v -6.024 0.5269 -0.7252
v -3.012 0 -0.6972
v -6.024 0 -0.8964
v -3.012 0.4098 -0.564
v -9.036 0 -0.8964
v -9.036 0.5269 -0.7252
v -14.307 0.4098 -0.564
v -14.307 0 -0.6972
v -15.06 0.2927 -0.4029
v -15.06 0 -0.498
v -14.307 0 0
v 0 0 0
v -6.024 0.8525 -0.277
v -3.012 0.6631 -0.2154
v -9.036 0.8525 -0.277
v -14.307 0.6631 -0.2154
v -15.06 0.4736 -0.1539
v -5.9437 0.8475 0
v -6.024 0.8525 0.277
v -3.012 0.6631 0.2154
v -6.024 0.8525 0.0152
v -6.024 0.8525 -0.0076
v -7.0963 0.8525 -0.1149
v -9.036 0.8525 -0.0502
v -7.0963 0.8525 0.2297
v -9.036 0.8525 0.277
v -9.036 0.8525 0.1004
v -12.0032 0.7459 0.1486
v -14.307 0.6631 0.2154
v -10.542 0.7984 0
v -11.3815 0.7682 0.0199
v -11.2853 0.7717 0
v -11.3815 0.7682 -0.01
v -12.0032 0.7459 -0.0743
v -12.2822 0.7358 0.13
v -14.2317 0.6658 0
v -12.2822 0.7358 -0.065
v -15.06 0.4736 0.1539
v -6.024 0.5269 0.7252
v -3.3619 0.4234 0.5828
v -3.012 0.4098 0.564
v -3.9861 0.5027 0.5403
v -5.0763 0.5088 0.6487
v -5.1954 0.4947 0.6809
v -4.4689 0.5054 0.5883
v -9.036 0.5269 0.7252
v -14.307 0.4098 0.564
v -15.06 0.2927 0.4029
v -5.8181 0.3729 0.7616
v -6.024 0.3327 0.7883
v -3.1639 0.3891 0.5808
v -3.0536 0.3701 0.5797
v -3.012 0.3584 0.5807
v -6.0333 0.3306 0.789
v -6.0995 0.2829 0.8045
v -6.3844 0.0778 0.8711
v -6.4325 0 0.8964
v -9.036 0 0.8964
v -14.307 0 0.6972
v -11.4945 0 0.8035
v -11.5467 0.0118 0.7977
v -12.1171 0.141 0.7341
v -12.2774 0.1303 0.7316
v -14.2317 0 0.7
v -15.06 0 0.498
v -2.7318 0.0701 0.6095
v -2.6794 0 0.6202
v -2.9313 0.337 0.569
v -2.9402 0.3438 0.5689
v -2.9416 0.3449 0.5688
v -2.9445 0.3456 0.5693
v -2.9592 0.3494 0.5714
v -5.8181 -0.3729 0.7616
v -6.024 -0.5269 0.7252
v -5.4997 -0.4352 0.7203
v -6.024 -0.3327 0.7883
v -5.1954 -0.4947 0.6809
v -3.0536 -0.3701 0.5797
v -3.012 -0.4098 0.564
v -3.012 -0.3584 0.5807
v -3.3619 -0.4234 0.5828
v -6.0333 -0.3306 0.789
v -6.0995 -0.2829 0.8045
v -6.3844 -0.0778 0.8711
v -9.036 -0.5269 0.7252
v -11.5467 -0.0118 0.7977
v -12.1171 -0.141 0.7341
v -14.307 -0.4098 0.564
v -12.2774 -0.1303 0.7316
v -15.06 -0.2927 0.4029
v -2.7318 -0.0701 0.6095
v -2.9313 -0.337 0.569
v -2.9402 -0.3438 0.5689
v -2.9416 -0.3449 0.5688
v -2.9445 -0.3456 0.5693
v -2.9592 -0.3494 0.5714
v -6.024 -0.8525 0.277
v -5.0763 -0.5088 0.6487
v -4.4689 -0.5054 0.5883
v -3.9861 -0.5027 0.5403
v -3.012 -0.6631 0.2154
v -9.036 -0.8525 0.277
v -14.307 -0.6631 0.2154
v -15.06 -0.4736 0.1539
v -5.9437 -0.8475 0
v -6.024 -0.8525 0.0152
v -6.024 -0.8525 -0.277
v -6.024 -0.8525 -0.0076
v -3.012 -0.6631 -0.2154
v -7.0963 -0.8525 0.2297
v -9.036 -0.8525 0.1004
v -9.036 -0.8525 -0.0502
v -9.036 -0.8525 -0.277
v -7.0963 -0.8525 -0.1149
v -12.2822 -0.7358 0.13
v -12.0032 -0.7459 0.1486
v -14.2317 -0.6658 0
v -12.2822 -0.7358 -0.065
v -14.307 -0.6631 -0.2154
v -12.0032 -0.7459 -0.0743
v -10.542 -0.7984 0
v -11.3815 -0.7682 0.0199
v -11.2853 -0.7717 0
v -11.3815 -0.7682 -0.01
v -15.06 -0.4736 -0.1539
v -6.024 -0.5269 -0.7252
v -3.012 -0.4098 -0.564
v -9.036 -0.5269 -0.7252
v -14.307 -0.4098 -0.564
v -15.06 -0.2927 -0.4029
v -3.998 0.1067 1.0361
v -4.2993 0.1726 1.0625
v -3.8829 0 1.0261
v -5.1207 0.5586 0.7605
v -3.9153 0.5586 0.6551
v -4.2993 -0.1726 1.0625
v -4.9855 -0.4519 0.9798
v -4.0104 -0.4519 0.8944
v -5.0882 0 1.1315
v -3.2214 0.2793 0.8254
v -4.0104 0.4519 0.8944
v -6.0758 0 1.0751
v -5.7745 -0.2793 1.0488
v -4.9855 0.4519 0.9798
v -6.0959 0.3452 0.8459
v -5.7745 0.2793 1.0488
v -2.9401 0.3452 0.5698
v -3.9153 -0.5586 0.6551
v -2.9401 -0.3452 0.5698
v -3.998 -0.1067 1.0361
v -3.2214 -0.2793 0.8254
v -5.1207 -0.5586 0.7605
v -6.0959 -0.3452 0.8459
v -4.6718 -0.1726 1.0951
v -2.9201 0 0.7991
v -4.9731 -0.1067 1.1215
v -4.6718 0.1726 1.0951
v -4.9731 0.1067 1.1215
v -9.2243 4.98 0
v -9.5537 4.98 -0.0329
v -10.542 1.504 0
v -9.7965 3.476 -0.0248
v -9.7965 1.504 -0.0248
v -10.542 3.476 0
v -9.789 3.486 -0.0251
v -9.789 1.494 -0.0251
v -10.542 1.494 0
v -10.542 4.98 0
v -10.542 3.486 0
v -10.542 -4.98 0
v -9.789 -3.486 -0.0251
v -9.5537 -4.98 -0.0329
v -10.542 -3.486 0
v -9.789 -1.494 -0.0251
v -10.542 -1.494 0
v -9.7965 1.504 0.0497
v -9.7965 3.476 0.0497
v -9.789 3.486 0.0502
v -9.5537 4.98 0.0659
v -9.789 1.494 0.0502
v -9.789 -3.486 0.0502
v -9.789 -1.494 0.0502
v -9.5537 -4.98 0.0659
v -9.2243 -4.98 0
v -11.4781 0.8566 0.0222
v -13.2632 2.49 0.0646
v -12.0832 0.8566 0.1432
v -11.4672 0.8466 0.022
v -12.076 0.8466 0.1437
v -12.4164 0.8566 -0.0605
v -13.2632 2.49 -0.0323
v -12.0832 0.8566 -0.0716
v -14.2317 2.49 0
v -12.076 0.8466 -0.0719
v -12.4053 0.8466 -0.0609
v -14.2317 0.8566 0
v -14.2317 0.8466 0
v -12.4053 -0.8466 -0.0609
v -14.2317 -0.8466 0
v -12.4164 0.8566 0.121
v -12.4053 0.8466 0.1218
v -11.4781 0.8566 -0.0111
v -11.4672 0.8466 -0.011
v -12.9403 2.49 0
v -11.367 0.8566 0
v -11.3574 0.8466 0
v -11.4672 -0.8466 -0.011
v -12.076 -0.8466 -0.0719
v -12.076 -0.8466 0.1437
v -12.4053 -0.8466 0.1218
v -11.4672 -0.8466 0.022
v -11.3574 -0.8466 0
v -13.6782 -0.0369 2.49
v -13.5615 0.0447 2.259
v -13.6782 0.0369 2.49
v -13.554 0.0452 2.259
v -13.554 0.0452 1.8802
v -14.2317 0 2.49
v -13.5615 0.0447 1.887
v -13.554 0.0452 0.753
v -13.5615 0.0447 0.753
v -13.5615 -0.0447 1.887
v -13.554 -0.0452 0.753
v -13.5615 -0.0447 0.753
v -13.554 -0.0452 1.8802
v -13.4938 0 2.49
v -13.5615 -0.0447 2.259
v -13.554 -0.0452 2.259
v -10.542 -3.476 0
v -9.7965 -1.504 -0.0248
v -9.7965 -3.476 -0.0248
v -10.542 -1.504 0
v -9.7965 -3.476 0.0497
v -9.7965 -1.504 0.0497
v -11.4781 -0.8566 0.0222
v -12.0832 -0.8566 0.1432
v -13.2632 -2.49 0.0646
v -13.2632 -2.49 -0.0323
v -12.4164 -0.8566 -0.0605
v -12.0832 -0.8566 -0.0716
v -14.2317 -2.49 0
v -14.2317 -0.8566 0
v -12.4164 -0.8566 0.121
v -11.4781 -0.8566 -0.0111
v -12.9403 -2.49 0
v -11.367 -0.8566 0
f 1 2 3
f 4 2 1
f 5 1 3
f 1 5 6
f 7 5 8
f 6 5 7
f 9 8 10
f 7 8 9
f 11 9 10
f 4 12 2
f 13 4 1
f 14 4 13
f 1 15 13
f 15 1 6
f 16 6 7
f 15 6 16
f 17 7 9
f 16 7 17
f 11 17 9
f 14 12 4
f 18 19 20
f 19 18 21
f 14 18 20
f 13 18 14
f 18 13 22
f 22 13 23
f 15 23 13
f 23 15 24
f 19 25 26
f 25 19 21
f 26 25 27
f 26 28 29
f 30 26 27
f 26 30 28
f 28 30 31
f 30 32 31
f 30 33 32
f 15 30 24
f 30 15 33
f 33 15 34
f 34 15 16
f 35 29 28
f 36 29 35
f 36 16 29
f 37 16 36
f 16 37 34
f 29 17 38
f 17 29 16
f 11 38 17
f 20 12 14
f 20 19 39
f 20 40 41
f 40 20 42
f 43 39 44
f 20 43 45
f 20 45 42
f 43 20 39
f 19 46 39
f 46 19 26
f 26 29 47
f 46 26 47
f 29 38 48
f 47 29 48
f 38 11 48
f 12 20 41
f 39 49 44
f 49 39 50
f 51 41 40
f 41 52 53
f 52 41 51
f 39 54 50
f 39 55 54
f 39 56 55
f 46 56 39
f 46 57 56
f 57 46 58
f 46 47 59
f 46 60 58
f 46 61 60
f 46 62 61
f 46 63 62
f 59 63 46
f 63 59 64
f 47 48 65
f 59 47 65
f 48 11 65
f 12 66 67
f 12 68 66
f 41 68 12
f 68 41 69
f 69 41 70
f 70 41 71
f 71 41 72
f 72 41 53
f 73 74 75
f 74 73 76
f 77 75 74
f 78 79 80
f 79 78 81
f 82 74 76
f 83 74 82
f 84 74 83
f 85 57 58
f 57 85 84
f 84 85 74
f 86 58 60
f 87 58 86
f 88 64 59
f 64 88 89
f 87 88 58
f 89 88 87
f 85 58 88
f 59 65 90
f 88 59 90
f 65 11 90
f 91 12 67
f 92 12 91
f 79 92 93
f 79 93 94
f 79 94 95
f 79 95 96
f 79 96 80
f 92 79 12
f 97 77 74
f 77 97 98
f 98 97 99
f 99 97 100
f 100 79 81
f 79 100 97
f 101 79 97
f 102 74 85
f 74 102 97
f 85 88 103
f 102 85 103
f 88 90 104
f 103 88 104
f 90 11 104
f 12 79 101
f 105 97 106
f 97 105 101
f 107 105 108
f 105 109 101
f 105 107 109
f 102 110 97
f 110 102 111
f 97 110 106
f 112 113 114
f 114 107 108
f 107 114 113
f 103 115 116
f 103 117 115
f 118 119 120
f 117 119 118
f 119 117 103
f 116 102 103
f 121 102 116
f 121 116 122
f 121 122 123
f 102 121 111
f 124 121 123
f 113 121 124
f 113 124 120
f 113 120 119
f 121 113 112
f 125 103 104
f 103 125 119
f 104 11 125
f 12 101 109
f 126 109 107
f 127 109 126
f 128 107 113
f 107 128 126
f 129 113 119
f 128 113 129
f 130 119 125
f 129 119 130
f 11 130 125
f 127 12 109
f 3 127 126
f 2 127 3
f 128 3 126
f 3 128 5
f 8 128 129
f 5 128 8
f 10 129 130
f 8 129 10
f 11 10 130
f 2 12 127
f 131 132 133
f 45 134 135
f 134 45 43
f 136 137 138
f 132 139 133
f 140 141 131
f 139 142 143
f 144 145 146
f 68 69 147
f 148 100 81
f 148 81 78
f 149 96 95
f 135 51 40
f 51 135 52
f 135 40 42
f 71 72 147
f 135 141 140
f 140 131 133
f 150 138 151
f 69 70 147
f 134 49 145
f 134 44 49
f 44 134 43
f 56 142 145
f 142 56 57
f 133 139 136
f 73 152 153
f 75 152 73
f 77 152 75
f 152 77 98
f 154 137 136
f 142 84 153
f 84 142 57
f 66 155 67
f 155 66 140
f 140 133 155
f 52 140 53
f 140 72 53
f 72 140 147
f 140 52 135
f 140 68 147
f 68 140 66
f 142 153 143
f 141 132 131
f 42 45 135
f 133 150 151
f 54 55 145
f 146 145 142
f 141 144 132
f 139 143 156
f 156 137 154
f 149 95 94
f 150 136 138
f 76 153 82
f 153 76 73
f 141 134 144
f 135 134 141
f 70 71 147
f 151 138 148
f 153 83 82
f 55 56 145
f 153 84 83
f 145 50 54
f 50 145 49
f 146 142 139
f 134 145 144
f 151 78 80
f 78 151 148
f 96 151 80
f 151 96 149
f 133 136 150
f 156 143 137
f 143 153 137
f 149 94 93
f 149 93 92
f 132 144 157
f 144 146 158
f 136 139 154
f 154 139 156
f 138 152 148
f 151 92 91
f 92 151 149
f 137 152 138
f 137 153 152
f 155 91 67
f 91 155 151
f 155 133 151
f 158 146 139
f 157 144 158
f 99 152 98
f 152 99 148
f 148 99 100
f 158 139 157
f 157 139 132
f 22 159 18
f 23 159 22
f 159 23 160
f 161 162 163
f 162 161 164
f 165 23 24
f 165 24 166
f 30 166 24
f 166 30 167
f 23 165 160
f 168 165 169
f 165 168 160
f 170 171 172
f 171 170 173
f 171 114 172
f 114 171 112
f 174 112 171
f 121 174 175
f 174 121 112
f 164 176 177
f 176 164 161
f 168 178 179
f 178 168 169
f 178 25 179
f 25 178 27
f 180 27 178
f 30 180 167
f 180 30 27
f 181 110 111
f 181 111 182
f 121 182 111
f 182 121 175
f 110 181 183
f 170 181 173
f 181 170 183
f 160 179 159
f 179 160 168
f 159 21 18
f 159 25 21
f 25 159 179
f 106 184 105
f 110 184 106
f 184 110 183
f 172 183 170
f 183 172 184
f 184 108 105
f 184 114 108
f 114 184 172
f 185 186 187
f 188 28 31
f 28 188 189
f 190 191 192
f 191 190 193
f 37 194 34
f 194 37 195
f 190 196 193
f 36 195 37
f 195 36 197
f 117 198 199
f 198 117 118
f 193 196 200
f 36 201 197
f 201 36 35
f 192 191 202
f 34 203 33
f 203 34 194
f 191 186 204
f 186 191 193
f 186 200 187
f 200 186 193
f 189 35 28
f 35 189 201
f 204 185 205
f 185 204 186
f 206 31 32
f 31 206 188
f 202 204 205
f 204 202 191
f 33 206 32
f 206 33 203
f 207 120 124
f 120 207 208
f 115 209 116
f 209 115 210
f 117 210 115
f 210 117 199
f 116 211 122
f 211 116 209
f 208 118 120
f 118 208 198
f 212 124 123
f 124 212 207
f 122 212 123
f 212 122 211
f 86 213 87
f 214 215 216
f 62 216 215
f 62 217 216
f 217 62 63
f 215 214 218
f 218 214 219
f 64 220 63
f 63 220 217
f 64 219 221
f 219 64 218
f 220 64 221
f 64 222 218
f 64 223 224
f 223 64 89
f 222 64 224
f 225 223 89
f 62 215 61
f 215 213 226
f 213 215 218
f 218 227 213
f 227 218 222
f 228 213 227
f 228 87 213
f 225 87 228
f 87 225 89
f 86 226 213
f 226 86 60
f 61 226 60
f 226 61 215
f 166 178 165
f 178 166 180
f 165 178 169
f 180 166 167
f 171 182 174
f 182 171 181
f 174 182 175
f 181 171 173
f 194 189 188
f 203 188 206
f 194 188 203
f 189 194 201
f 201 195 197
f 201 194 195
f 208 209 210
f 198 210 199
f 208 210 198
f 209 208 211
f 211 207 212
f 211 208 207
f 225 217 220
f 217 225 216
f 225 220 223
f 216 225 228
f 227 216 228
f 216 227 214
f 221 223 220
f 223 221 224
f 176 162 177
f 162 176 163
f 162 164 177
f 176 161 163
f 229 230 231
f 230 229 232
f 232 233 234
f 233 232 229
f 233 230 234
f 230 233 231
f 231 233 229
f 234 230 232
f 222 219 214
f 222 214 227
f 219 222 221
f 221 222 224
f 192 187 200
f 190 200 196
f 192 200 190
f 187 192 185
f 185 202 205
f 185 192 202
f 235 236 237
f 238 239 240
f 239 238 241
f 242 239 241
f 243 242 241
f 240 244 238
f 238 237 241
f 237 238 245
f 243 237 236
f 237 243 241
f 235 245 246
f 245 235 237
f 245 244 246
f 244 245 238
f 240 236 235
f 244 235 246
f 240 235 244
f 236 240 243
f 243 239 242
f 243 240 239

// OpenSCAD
$fn=10;
length = 15.06;
wingspan = 9.96;

chord = length*0.35;
taper = 0.25;

tail_span = wingspan*0.5;
tail_chord = chord*0.7;
tail_taper = 0.35;

vert_span = tail_span;
vert_chord = tail_chord;
vert_taper = 0.2;

module wing(chord, wingspan, taper) {
    color([0.6, 0.6, 0.6]) translate([-chord, 0]) rotate([90, 0, 180]) linear_extrude(height=wingspan/2, scale=taper) polygon([
        [0, 0],
        [-chord*0.75, 0.05*chord],
        [-chord, 0],
        [-chord*0.75, -0.025*chord]
    ]);
}

module wing_sym(chord, wingspan, taper) {
    color([0.6, 0.6, 0.6]) translate([-chord, 0]) rotate([90, 0, 180]) linear_extrude(height=wingspan/2, scale=taper) polygon([
        [0, 0],
        [-chord*0.75, 0.05*chord],
        [-chord, 0],
        [-chord*0.75, -0.05*chord]
    ]);
}

module airframe_half() {
    translate([-length*0.35, 0]) wing(chord, wingspan, taper);
    translate([-length*0.7, 0]) wing(tail_chord, tail_span, tail_taper);
    translate([-length*0.7, 0]) rotate([90, 0, 0]) 
        wing(vert_chord, vert_span, vert_taper);
}

module body() {
    color([0.6, 0.6, 0.6]) rotate([0, -90, 0]) rotate_extrude() polygon([
        [0,0],
        [0.07*wingspan,0.2*length],
        [0.09*wingspan,0.4*length],
        [0.09*wingspan,0.6*length],
        [0.07*wingspan,0.95*length],
        [0.05*wingspan,length],
        [0,0.95*length]
    ]);
    color([0.6, 0.6, 0.8]) translate([-0.3*length, 0, 0.047*length]) rotate([0, 5, 0]) scale([1, 0.3, 0.2]) sphere(0.13*length);
}

module airframe_no_cuts() {
    body();
    translate([-length*0.35, 0]) wing(chord, wingspan, taper);
    mirror([0, 1, 0]) translate([-length*0.35, 0]) wing(chord, wingspan, taper);
    translate([-length*0.7, 0]) wing(tail_chord, tail_span, tail_taper);
    mirror([0, 1, 0]) translate([-length*0.7, 0]) wing(tail_chord, tail_span, tail_taper);
    translate([-length*0.7, 0]) rotate([90, 0, 0]) 
        wing_sym(vert_chord, vert_span, vert_taper);
}

module aileron_cut(s) {
    translate([-0.7*length, wingspan/4, 0]) scale([s, s, 1]) cube([length*0.1, wingspan*0.2, length*0.1], center=true);
}

module elevator_cut(s) {
    translate([-0.9*length, tail_span*0.37, 0]) scale([s, s, 1]) cube([length*0.3, wingspan*0.2, length*0.1], center=true);
}

module rudder_cut(s) {
    translate([-length*0.95, 0, length*0.1]) scale([s, s, 1]) cube([length*0.1, wingspan*0.2, length*0.1], center=true);
}

module airframe() {
    difference() {
        airframe_no_cuts();
        aileron_cut(1);
        mirror([0, 1, 0]) aileron_cut(1);
        elevator_cut(1);
        mirror([0, 1, 0]) elevator_cut(1);
        rudder_cut();
    }
}

module aileron() {
    color("red") render() intersection() {
        aileron_cut(0.99);
        airframe_no_cuts();
    }
}

module elevator() {
    color("red") render() intersection() {
        elevator_cut(0.99);
        airframe_no_cuts();
    }
}

module rudder() {
    color("red") render() intersection() {
        rudder_cut(0.99);
        airframe_no_cuts();
    }
}

module assembly() {
    airframe();
    aileron();
    mirror([0, 1, 0]) aileron();
    rudder();
    elevator();
    mirror([0, 1, 0]) elevator();
}

part = "assembly";

if (part == "airframe") {
    airframe();
} else if (part == "left_aileron") {
    aileron();
} else if (part == "left_elevator") {
    elevator();
} else if (part == "right_aileron") {
    mirror([0, 1, 0]) aileron();
} else if (part == "right_elevator") {
    mirror([0, 1, 0]) elevator();
} else if (part == "rudder") {
    rudder();
} else {
    assembly();
}
